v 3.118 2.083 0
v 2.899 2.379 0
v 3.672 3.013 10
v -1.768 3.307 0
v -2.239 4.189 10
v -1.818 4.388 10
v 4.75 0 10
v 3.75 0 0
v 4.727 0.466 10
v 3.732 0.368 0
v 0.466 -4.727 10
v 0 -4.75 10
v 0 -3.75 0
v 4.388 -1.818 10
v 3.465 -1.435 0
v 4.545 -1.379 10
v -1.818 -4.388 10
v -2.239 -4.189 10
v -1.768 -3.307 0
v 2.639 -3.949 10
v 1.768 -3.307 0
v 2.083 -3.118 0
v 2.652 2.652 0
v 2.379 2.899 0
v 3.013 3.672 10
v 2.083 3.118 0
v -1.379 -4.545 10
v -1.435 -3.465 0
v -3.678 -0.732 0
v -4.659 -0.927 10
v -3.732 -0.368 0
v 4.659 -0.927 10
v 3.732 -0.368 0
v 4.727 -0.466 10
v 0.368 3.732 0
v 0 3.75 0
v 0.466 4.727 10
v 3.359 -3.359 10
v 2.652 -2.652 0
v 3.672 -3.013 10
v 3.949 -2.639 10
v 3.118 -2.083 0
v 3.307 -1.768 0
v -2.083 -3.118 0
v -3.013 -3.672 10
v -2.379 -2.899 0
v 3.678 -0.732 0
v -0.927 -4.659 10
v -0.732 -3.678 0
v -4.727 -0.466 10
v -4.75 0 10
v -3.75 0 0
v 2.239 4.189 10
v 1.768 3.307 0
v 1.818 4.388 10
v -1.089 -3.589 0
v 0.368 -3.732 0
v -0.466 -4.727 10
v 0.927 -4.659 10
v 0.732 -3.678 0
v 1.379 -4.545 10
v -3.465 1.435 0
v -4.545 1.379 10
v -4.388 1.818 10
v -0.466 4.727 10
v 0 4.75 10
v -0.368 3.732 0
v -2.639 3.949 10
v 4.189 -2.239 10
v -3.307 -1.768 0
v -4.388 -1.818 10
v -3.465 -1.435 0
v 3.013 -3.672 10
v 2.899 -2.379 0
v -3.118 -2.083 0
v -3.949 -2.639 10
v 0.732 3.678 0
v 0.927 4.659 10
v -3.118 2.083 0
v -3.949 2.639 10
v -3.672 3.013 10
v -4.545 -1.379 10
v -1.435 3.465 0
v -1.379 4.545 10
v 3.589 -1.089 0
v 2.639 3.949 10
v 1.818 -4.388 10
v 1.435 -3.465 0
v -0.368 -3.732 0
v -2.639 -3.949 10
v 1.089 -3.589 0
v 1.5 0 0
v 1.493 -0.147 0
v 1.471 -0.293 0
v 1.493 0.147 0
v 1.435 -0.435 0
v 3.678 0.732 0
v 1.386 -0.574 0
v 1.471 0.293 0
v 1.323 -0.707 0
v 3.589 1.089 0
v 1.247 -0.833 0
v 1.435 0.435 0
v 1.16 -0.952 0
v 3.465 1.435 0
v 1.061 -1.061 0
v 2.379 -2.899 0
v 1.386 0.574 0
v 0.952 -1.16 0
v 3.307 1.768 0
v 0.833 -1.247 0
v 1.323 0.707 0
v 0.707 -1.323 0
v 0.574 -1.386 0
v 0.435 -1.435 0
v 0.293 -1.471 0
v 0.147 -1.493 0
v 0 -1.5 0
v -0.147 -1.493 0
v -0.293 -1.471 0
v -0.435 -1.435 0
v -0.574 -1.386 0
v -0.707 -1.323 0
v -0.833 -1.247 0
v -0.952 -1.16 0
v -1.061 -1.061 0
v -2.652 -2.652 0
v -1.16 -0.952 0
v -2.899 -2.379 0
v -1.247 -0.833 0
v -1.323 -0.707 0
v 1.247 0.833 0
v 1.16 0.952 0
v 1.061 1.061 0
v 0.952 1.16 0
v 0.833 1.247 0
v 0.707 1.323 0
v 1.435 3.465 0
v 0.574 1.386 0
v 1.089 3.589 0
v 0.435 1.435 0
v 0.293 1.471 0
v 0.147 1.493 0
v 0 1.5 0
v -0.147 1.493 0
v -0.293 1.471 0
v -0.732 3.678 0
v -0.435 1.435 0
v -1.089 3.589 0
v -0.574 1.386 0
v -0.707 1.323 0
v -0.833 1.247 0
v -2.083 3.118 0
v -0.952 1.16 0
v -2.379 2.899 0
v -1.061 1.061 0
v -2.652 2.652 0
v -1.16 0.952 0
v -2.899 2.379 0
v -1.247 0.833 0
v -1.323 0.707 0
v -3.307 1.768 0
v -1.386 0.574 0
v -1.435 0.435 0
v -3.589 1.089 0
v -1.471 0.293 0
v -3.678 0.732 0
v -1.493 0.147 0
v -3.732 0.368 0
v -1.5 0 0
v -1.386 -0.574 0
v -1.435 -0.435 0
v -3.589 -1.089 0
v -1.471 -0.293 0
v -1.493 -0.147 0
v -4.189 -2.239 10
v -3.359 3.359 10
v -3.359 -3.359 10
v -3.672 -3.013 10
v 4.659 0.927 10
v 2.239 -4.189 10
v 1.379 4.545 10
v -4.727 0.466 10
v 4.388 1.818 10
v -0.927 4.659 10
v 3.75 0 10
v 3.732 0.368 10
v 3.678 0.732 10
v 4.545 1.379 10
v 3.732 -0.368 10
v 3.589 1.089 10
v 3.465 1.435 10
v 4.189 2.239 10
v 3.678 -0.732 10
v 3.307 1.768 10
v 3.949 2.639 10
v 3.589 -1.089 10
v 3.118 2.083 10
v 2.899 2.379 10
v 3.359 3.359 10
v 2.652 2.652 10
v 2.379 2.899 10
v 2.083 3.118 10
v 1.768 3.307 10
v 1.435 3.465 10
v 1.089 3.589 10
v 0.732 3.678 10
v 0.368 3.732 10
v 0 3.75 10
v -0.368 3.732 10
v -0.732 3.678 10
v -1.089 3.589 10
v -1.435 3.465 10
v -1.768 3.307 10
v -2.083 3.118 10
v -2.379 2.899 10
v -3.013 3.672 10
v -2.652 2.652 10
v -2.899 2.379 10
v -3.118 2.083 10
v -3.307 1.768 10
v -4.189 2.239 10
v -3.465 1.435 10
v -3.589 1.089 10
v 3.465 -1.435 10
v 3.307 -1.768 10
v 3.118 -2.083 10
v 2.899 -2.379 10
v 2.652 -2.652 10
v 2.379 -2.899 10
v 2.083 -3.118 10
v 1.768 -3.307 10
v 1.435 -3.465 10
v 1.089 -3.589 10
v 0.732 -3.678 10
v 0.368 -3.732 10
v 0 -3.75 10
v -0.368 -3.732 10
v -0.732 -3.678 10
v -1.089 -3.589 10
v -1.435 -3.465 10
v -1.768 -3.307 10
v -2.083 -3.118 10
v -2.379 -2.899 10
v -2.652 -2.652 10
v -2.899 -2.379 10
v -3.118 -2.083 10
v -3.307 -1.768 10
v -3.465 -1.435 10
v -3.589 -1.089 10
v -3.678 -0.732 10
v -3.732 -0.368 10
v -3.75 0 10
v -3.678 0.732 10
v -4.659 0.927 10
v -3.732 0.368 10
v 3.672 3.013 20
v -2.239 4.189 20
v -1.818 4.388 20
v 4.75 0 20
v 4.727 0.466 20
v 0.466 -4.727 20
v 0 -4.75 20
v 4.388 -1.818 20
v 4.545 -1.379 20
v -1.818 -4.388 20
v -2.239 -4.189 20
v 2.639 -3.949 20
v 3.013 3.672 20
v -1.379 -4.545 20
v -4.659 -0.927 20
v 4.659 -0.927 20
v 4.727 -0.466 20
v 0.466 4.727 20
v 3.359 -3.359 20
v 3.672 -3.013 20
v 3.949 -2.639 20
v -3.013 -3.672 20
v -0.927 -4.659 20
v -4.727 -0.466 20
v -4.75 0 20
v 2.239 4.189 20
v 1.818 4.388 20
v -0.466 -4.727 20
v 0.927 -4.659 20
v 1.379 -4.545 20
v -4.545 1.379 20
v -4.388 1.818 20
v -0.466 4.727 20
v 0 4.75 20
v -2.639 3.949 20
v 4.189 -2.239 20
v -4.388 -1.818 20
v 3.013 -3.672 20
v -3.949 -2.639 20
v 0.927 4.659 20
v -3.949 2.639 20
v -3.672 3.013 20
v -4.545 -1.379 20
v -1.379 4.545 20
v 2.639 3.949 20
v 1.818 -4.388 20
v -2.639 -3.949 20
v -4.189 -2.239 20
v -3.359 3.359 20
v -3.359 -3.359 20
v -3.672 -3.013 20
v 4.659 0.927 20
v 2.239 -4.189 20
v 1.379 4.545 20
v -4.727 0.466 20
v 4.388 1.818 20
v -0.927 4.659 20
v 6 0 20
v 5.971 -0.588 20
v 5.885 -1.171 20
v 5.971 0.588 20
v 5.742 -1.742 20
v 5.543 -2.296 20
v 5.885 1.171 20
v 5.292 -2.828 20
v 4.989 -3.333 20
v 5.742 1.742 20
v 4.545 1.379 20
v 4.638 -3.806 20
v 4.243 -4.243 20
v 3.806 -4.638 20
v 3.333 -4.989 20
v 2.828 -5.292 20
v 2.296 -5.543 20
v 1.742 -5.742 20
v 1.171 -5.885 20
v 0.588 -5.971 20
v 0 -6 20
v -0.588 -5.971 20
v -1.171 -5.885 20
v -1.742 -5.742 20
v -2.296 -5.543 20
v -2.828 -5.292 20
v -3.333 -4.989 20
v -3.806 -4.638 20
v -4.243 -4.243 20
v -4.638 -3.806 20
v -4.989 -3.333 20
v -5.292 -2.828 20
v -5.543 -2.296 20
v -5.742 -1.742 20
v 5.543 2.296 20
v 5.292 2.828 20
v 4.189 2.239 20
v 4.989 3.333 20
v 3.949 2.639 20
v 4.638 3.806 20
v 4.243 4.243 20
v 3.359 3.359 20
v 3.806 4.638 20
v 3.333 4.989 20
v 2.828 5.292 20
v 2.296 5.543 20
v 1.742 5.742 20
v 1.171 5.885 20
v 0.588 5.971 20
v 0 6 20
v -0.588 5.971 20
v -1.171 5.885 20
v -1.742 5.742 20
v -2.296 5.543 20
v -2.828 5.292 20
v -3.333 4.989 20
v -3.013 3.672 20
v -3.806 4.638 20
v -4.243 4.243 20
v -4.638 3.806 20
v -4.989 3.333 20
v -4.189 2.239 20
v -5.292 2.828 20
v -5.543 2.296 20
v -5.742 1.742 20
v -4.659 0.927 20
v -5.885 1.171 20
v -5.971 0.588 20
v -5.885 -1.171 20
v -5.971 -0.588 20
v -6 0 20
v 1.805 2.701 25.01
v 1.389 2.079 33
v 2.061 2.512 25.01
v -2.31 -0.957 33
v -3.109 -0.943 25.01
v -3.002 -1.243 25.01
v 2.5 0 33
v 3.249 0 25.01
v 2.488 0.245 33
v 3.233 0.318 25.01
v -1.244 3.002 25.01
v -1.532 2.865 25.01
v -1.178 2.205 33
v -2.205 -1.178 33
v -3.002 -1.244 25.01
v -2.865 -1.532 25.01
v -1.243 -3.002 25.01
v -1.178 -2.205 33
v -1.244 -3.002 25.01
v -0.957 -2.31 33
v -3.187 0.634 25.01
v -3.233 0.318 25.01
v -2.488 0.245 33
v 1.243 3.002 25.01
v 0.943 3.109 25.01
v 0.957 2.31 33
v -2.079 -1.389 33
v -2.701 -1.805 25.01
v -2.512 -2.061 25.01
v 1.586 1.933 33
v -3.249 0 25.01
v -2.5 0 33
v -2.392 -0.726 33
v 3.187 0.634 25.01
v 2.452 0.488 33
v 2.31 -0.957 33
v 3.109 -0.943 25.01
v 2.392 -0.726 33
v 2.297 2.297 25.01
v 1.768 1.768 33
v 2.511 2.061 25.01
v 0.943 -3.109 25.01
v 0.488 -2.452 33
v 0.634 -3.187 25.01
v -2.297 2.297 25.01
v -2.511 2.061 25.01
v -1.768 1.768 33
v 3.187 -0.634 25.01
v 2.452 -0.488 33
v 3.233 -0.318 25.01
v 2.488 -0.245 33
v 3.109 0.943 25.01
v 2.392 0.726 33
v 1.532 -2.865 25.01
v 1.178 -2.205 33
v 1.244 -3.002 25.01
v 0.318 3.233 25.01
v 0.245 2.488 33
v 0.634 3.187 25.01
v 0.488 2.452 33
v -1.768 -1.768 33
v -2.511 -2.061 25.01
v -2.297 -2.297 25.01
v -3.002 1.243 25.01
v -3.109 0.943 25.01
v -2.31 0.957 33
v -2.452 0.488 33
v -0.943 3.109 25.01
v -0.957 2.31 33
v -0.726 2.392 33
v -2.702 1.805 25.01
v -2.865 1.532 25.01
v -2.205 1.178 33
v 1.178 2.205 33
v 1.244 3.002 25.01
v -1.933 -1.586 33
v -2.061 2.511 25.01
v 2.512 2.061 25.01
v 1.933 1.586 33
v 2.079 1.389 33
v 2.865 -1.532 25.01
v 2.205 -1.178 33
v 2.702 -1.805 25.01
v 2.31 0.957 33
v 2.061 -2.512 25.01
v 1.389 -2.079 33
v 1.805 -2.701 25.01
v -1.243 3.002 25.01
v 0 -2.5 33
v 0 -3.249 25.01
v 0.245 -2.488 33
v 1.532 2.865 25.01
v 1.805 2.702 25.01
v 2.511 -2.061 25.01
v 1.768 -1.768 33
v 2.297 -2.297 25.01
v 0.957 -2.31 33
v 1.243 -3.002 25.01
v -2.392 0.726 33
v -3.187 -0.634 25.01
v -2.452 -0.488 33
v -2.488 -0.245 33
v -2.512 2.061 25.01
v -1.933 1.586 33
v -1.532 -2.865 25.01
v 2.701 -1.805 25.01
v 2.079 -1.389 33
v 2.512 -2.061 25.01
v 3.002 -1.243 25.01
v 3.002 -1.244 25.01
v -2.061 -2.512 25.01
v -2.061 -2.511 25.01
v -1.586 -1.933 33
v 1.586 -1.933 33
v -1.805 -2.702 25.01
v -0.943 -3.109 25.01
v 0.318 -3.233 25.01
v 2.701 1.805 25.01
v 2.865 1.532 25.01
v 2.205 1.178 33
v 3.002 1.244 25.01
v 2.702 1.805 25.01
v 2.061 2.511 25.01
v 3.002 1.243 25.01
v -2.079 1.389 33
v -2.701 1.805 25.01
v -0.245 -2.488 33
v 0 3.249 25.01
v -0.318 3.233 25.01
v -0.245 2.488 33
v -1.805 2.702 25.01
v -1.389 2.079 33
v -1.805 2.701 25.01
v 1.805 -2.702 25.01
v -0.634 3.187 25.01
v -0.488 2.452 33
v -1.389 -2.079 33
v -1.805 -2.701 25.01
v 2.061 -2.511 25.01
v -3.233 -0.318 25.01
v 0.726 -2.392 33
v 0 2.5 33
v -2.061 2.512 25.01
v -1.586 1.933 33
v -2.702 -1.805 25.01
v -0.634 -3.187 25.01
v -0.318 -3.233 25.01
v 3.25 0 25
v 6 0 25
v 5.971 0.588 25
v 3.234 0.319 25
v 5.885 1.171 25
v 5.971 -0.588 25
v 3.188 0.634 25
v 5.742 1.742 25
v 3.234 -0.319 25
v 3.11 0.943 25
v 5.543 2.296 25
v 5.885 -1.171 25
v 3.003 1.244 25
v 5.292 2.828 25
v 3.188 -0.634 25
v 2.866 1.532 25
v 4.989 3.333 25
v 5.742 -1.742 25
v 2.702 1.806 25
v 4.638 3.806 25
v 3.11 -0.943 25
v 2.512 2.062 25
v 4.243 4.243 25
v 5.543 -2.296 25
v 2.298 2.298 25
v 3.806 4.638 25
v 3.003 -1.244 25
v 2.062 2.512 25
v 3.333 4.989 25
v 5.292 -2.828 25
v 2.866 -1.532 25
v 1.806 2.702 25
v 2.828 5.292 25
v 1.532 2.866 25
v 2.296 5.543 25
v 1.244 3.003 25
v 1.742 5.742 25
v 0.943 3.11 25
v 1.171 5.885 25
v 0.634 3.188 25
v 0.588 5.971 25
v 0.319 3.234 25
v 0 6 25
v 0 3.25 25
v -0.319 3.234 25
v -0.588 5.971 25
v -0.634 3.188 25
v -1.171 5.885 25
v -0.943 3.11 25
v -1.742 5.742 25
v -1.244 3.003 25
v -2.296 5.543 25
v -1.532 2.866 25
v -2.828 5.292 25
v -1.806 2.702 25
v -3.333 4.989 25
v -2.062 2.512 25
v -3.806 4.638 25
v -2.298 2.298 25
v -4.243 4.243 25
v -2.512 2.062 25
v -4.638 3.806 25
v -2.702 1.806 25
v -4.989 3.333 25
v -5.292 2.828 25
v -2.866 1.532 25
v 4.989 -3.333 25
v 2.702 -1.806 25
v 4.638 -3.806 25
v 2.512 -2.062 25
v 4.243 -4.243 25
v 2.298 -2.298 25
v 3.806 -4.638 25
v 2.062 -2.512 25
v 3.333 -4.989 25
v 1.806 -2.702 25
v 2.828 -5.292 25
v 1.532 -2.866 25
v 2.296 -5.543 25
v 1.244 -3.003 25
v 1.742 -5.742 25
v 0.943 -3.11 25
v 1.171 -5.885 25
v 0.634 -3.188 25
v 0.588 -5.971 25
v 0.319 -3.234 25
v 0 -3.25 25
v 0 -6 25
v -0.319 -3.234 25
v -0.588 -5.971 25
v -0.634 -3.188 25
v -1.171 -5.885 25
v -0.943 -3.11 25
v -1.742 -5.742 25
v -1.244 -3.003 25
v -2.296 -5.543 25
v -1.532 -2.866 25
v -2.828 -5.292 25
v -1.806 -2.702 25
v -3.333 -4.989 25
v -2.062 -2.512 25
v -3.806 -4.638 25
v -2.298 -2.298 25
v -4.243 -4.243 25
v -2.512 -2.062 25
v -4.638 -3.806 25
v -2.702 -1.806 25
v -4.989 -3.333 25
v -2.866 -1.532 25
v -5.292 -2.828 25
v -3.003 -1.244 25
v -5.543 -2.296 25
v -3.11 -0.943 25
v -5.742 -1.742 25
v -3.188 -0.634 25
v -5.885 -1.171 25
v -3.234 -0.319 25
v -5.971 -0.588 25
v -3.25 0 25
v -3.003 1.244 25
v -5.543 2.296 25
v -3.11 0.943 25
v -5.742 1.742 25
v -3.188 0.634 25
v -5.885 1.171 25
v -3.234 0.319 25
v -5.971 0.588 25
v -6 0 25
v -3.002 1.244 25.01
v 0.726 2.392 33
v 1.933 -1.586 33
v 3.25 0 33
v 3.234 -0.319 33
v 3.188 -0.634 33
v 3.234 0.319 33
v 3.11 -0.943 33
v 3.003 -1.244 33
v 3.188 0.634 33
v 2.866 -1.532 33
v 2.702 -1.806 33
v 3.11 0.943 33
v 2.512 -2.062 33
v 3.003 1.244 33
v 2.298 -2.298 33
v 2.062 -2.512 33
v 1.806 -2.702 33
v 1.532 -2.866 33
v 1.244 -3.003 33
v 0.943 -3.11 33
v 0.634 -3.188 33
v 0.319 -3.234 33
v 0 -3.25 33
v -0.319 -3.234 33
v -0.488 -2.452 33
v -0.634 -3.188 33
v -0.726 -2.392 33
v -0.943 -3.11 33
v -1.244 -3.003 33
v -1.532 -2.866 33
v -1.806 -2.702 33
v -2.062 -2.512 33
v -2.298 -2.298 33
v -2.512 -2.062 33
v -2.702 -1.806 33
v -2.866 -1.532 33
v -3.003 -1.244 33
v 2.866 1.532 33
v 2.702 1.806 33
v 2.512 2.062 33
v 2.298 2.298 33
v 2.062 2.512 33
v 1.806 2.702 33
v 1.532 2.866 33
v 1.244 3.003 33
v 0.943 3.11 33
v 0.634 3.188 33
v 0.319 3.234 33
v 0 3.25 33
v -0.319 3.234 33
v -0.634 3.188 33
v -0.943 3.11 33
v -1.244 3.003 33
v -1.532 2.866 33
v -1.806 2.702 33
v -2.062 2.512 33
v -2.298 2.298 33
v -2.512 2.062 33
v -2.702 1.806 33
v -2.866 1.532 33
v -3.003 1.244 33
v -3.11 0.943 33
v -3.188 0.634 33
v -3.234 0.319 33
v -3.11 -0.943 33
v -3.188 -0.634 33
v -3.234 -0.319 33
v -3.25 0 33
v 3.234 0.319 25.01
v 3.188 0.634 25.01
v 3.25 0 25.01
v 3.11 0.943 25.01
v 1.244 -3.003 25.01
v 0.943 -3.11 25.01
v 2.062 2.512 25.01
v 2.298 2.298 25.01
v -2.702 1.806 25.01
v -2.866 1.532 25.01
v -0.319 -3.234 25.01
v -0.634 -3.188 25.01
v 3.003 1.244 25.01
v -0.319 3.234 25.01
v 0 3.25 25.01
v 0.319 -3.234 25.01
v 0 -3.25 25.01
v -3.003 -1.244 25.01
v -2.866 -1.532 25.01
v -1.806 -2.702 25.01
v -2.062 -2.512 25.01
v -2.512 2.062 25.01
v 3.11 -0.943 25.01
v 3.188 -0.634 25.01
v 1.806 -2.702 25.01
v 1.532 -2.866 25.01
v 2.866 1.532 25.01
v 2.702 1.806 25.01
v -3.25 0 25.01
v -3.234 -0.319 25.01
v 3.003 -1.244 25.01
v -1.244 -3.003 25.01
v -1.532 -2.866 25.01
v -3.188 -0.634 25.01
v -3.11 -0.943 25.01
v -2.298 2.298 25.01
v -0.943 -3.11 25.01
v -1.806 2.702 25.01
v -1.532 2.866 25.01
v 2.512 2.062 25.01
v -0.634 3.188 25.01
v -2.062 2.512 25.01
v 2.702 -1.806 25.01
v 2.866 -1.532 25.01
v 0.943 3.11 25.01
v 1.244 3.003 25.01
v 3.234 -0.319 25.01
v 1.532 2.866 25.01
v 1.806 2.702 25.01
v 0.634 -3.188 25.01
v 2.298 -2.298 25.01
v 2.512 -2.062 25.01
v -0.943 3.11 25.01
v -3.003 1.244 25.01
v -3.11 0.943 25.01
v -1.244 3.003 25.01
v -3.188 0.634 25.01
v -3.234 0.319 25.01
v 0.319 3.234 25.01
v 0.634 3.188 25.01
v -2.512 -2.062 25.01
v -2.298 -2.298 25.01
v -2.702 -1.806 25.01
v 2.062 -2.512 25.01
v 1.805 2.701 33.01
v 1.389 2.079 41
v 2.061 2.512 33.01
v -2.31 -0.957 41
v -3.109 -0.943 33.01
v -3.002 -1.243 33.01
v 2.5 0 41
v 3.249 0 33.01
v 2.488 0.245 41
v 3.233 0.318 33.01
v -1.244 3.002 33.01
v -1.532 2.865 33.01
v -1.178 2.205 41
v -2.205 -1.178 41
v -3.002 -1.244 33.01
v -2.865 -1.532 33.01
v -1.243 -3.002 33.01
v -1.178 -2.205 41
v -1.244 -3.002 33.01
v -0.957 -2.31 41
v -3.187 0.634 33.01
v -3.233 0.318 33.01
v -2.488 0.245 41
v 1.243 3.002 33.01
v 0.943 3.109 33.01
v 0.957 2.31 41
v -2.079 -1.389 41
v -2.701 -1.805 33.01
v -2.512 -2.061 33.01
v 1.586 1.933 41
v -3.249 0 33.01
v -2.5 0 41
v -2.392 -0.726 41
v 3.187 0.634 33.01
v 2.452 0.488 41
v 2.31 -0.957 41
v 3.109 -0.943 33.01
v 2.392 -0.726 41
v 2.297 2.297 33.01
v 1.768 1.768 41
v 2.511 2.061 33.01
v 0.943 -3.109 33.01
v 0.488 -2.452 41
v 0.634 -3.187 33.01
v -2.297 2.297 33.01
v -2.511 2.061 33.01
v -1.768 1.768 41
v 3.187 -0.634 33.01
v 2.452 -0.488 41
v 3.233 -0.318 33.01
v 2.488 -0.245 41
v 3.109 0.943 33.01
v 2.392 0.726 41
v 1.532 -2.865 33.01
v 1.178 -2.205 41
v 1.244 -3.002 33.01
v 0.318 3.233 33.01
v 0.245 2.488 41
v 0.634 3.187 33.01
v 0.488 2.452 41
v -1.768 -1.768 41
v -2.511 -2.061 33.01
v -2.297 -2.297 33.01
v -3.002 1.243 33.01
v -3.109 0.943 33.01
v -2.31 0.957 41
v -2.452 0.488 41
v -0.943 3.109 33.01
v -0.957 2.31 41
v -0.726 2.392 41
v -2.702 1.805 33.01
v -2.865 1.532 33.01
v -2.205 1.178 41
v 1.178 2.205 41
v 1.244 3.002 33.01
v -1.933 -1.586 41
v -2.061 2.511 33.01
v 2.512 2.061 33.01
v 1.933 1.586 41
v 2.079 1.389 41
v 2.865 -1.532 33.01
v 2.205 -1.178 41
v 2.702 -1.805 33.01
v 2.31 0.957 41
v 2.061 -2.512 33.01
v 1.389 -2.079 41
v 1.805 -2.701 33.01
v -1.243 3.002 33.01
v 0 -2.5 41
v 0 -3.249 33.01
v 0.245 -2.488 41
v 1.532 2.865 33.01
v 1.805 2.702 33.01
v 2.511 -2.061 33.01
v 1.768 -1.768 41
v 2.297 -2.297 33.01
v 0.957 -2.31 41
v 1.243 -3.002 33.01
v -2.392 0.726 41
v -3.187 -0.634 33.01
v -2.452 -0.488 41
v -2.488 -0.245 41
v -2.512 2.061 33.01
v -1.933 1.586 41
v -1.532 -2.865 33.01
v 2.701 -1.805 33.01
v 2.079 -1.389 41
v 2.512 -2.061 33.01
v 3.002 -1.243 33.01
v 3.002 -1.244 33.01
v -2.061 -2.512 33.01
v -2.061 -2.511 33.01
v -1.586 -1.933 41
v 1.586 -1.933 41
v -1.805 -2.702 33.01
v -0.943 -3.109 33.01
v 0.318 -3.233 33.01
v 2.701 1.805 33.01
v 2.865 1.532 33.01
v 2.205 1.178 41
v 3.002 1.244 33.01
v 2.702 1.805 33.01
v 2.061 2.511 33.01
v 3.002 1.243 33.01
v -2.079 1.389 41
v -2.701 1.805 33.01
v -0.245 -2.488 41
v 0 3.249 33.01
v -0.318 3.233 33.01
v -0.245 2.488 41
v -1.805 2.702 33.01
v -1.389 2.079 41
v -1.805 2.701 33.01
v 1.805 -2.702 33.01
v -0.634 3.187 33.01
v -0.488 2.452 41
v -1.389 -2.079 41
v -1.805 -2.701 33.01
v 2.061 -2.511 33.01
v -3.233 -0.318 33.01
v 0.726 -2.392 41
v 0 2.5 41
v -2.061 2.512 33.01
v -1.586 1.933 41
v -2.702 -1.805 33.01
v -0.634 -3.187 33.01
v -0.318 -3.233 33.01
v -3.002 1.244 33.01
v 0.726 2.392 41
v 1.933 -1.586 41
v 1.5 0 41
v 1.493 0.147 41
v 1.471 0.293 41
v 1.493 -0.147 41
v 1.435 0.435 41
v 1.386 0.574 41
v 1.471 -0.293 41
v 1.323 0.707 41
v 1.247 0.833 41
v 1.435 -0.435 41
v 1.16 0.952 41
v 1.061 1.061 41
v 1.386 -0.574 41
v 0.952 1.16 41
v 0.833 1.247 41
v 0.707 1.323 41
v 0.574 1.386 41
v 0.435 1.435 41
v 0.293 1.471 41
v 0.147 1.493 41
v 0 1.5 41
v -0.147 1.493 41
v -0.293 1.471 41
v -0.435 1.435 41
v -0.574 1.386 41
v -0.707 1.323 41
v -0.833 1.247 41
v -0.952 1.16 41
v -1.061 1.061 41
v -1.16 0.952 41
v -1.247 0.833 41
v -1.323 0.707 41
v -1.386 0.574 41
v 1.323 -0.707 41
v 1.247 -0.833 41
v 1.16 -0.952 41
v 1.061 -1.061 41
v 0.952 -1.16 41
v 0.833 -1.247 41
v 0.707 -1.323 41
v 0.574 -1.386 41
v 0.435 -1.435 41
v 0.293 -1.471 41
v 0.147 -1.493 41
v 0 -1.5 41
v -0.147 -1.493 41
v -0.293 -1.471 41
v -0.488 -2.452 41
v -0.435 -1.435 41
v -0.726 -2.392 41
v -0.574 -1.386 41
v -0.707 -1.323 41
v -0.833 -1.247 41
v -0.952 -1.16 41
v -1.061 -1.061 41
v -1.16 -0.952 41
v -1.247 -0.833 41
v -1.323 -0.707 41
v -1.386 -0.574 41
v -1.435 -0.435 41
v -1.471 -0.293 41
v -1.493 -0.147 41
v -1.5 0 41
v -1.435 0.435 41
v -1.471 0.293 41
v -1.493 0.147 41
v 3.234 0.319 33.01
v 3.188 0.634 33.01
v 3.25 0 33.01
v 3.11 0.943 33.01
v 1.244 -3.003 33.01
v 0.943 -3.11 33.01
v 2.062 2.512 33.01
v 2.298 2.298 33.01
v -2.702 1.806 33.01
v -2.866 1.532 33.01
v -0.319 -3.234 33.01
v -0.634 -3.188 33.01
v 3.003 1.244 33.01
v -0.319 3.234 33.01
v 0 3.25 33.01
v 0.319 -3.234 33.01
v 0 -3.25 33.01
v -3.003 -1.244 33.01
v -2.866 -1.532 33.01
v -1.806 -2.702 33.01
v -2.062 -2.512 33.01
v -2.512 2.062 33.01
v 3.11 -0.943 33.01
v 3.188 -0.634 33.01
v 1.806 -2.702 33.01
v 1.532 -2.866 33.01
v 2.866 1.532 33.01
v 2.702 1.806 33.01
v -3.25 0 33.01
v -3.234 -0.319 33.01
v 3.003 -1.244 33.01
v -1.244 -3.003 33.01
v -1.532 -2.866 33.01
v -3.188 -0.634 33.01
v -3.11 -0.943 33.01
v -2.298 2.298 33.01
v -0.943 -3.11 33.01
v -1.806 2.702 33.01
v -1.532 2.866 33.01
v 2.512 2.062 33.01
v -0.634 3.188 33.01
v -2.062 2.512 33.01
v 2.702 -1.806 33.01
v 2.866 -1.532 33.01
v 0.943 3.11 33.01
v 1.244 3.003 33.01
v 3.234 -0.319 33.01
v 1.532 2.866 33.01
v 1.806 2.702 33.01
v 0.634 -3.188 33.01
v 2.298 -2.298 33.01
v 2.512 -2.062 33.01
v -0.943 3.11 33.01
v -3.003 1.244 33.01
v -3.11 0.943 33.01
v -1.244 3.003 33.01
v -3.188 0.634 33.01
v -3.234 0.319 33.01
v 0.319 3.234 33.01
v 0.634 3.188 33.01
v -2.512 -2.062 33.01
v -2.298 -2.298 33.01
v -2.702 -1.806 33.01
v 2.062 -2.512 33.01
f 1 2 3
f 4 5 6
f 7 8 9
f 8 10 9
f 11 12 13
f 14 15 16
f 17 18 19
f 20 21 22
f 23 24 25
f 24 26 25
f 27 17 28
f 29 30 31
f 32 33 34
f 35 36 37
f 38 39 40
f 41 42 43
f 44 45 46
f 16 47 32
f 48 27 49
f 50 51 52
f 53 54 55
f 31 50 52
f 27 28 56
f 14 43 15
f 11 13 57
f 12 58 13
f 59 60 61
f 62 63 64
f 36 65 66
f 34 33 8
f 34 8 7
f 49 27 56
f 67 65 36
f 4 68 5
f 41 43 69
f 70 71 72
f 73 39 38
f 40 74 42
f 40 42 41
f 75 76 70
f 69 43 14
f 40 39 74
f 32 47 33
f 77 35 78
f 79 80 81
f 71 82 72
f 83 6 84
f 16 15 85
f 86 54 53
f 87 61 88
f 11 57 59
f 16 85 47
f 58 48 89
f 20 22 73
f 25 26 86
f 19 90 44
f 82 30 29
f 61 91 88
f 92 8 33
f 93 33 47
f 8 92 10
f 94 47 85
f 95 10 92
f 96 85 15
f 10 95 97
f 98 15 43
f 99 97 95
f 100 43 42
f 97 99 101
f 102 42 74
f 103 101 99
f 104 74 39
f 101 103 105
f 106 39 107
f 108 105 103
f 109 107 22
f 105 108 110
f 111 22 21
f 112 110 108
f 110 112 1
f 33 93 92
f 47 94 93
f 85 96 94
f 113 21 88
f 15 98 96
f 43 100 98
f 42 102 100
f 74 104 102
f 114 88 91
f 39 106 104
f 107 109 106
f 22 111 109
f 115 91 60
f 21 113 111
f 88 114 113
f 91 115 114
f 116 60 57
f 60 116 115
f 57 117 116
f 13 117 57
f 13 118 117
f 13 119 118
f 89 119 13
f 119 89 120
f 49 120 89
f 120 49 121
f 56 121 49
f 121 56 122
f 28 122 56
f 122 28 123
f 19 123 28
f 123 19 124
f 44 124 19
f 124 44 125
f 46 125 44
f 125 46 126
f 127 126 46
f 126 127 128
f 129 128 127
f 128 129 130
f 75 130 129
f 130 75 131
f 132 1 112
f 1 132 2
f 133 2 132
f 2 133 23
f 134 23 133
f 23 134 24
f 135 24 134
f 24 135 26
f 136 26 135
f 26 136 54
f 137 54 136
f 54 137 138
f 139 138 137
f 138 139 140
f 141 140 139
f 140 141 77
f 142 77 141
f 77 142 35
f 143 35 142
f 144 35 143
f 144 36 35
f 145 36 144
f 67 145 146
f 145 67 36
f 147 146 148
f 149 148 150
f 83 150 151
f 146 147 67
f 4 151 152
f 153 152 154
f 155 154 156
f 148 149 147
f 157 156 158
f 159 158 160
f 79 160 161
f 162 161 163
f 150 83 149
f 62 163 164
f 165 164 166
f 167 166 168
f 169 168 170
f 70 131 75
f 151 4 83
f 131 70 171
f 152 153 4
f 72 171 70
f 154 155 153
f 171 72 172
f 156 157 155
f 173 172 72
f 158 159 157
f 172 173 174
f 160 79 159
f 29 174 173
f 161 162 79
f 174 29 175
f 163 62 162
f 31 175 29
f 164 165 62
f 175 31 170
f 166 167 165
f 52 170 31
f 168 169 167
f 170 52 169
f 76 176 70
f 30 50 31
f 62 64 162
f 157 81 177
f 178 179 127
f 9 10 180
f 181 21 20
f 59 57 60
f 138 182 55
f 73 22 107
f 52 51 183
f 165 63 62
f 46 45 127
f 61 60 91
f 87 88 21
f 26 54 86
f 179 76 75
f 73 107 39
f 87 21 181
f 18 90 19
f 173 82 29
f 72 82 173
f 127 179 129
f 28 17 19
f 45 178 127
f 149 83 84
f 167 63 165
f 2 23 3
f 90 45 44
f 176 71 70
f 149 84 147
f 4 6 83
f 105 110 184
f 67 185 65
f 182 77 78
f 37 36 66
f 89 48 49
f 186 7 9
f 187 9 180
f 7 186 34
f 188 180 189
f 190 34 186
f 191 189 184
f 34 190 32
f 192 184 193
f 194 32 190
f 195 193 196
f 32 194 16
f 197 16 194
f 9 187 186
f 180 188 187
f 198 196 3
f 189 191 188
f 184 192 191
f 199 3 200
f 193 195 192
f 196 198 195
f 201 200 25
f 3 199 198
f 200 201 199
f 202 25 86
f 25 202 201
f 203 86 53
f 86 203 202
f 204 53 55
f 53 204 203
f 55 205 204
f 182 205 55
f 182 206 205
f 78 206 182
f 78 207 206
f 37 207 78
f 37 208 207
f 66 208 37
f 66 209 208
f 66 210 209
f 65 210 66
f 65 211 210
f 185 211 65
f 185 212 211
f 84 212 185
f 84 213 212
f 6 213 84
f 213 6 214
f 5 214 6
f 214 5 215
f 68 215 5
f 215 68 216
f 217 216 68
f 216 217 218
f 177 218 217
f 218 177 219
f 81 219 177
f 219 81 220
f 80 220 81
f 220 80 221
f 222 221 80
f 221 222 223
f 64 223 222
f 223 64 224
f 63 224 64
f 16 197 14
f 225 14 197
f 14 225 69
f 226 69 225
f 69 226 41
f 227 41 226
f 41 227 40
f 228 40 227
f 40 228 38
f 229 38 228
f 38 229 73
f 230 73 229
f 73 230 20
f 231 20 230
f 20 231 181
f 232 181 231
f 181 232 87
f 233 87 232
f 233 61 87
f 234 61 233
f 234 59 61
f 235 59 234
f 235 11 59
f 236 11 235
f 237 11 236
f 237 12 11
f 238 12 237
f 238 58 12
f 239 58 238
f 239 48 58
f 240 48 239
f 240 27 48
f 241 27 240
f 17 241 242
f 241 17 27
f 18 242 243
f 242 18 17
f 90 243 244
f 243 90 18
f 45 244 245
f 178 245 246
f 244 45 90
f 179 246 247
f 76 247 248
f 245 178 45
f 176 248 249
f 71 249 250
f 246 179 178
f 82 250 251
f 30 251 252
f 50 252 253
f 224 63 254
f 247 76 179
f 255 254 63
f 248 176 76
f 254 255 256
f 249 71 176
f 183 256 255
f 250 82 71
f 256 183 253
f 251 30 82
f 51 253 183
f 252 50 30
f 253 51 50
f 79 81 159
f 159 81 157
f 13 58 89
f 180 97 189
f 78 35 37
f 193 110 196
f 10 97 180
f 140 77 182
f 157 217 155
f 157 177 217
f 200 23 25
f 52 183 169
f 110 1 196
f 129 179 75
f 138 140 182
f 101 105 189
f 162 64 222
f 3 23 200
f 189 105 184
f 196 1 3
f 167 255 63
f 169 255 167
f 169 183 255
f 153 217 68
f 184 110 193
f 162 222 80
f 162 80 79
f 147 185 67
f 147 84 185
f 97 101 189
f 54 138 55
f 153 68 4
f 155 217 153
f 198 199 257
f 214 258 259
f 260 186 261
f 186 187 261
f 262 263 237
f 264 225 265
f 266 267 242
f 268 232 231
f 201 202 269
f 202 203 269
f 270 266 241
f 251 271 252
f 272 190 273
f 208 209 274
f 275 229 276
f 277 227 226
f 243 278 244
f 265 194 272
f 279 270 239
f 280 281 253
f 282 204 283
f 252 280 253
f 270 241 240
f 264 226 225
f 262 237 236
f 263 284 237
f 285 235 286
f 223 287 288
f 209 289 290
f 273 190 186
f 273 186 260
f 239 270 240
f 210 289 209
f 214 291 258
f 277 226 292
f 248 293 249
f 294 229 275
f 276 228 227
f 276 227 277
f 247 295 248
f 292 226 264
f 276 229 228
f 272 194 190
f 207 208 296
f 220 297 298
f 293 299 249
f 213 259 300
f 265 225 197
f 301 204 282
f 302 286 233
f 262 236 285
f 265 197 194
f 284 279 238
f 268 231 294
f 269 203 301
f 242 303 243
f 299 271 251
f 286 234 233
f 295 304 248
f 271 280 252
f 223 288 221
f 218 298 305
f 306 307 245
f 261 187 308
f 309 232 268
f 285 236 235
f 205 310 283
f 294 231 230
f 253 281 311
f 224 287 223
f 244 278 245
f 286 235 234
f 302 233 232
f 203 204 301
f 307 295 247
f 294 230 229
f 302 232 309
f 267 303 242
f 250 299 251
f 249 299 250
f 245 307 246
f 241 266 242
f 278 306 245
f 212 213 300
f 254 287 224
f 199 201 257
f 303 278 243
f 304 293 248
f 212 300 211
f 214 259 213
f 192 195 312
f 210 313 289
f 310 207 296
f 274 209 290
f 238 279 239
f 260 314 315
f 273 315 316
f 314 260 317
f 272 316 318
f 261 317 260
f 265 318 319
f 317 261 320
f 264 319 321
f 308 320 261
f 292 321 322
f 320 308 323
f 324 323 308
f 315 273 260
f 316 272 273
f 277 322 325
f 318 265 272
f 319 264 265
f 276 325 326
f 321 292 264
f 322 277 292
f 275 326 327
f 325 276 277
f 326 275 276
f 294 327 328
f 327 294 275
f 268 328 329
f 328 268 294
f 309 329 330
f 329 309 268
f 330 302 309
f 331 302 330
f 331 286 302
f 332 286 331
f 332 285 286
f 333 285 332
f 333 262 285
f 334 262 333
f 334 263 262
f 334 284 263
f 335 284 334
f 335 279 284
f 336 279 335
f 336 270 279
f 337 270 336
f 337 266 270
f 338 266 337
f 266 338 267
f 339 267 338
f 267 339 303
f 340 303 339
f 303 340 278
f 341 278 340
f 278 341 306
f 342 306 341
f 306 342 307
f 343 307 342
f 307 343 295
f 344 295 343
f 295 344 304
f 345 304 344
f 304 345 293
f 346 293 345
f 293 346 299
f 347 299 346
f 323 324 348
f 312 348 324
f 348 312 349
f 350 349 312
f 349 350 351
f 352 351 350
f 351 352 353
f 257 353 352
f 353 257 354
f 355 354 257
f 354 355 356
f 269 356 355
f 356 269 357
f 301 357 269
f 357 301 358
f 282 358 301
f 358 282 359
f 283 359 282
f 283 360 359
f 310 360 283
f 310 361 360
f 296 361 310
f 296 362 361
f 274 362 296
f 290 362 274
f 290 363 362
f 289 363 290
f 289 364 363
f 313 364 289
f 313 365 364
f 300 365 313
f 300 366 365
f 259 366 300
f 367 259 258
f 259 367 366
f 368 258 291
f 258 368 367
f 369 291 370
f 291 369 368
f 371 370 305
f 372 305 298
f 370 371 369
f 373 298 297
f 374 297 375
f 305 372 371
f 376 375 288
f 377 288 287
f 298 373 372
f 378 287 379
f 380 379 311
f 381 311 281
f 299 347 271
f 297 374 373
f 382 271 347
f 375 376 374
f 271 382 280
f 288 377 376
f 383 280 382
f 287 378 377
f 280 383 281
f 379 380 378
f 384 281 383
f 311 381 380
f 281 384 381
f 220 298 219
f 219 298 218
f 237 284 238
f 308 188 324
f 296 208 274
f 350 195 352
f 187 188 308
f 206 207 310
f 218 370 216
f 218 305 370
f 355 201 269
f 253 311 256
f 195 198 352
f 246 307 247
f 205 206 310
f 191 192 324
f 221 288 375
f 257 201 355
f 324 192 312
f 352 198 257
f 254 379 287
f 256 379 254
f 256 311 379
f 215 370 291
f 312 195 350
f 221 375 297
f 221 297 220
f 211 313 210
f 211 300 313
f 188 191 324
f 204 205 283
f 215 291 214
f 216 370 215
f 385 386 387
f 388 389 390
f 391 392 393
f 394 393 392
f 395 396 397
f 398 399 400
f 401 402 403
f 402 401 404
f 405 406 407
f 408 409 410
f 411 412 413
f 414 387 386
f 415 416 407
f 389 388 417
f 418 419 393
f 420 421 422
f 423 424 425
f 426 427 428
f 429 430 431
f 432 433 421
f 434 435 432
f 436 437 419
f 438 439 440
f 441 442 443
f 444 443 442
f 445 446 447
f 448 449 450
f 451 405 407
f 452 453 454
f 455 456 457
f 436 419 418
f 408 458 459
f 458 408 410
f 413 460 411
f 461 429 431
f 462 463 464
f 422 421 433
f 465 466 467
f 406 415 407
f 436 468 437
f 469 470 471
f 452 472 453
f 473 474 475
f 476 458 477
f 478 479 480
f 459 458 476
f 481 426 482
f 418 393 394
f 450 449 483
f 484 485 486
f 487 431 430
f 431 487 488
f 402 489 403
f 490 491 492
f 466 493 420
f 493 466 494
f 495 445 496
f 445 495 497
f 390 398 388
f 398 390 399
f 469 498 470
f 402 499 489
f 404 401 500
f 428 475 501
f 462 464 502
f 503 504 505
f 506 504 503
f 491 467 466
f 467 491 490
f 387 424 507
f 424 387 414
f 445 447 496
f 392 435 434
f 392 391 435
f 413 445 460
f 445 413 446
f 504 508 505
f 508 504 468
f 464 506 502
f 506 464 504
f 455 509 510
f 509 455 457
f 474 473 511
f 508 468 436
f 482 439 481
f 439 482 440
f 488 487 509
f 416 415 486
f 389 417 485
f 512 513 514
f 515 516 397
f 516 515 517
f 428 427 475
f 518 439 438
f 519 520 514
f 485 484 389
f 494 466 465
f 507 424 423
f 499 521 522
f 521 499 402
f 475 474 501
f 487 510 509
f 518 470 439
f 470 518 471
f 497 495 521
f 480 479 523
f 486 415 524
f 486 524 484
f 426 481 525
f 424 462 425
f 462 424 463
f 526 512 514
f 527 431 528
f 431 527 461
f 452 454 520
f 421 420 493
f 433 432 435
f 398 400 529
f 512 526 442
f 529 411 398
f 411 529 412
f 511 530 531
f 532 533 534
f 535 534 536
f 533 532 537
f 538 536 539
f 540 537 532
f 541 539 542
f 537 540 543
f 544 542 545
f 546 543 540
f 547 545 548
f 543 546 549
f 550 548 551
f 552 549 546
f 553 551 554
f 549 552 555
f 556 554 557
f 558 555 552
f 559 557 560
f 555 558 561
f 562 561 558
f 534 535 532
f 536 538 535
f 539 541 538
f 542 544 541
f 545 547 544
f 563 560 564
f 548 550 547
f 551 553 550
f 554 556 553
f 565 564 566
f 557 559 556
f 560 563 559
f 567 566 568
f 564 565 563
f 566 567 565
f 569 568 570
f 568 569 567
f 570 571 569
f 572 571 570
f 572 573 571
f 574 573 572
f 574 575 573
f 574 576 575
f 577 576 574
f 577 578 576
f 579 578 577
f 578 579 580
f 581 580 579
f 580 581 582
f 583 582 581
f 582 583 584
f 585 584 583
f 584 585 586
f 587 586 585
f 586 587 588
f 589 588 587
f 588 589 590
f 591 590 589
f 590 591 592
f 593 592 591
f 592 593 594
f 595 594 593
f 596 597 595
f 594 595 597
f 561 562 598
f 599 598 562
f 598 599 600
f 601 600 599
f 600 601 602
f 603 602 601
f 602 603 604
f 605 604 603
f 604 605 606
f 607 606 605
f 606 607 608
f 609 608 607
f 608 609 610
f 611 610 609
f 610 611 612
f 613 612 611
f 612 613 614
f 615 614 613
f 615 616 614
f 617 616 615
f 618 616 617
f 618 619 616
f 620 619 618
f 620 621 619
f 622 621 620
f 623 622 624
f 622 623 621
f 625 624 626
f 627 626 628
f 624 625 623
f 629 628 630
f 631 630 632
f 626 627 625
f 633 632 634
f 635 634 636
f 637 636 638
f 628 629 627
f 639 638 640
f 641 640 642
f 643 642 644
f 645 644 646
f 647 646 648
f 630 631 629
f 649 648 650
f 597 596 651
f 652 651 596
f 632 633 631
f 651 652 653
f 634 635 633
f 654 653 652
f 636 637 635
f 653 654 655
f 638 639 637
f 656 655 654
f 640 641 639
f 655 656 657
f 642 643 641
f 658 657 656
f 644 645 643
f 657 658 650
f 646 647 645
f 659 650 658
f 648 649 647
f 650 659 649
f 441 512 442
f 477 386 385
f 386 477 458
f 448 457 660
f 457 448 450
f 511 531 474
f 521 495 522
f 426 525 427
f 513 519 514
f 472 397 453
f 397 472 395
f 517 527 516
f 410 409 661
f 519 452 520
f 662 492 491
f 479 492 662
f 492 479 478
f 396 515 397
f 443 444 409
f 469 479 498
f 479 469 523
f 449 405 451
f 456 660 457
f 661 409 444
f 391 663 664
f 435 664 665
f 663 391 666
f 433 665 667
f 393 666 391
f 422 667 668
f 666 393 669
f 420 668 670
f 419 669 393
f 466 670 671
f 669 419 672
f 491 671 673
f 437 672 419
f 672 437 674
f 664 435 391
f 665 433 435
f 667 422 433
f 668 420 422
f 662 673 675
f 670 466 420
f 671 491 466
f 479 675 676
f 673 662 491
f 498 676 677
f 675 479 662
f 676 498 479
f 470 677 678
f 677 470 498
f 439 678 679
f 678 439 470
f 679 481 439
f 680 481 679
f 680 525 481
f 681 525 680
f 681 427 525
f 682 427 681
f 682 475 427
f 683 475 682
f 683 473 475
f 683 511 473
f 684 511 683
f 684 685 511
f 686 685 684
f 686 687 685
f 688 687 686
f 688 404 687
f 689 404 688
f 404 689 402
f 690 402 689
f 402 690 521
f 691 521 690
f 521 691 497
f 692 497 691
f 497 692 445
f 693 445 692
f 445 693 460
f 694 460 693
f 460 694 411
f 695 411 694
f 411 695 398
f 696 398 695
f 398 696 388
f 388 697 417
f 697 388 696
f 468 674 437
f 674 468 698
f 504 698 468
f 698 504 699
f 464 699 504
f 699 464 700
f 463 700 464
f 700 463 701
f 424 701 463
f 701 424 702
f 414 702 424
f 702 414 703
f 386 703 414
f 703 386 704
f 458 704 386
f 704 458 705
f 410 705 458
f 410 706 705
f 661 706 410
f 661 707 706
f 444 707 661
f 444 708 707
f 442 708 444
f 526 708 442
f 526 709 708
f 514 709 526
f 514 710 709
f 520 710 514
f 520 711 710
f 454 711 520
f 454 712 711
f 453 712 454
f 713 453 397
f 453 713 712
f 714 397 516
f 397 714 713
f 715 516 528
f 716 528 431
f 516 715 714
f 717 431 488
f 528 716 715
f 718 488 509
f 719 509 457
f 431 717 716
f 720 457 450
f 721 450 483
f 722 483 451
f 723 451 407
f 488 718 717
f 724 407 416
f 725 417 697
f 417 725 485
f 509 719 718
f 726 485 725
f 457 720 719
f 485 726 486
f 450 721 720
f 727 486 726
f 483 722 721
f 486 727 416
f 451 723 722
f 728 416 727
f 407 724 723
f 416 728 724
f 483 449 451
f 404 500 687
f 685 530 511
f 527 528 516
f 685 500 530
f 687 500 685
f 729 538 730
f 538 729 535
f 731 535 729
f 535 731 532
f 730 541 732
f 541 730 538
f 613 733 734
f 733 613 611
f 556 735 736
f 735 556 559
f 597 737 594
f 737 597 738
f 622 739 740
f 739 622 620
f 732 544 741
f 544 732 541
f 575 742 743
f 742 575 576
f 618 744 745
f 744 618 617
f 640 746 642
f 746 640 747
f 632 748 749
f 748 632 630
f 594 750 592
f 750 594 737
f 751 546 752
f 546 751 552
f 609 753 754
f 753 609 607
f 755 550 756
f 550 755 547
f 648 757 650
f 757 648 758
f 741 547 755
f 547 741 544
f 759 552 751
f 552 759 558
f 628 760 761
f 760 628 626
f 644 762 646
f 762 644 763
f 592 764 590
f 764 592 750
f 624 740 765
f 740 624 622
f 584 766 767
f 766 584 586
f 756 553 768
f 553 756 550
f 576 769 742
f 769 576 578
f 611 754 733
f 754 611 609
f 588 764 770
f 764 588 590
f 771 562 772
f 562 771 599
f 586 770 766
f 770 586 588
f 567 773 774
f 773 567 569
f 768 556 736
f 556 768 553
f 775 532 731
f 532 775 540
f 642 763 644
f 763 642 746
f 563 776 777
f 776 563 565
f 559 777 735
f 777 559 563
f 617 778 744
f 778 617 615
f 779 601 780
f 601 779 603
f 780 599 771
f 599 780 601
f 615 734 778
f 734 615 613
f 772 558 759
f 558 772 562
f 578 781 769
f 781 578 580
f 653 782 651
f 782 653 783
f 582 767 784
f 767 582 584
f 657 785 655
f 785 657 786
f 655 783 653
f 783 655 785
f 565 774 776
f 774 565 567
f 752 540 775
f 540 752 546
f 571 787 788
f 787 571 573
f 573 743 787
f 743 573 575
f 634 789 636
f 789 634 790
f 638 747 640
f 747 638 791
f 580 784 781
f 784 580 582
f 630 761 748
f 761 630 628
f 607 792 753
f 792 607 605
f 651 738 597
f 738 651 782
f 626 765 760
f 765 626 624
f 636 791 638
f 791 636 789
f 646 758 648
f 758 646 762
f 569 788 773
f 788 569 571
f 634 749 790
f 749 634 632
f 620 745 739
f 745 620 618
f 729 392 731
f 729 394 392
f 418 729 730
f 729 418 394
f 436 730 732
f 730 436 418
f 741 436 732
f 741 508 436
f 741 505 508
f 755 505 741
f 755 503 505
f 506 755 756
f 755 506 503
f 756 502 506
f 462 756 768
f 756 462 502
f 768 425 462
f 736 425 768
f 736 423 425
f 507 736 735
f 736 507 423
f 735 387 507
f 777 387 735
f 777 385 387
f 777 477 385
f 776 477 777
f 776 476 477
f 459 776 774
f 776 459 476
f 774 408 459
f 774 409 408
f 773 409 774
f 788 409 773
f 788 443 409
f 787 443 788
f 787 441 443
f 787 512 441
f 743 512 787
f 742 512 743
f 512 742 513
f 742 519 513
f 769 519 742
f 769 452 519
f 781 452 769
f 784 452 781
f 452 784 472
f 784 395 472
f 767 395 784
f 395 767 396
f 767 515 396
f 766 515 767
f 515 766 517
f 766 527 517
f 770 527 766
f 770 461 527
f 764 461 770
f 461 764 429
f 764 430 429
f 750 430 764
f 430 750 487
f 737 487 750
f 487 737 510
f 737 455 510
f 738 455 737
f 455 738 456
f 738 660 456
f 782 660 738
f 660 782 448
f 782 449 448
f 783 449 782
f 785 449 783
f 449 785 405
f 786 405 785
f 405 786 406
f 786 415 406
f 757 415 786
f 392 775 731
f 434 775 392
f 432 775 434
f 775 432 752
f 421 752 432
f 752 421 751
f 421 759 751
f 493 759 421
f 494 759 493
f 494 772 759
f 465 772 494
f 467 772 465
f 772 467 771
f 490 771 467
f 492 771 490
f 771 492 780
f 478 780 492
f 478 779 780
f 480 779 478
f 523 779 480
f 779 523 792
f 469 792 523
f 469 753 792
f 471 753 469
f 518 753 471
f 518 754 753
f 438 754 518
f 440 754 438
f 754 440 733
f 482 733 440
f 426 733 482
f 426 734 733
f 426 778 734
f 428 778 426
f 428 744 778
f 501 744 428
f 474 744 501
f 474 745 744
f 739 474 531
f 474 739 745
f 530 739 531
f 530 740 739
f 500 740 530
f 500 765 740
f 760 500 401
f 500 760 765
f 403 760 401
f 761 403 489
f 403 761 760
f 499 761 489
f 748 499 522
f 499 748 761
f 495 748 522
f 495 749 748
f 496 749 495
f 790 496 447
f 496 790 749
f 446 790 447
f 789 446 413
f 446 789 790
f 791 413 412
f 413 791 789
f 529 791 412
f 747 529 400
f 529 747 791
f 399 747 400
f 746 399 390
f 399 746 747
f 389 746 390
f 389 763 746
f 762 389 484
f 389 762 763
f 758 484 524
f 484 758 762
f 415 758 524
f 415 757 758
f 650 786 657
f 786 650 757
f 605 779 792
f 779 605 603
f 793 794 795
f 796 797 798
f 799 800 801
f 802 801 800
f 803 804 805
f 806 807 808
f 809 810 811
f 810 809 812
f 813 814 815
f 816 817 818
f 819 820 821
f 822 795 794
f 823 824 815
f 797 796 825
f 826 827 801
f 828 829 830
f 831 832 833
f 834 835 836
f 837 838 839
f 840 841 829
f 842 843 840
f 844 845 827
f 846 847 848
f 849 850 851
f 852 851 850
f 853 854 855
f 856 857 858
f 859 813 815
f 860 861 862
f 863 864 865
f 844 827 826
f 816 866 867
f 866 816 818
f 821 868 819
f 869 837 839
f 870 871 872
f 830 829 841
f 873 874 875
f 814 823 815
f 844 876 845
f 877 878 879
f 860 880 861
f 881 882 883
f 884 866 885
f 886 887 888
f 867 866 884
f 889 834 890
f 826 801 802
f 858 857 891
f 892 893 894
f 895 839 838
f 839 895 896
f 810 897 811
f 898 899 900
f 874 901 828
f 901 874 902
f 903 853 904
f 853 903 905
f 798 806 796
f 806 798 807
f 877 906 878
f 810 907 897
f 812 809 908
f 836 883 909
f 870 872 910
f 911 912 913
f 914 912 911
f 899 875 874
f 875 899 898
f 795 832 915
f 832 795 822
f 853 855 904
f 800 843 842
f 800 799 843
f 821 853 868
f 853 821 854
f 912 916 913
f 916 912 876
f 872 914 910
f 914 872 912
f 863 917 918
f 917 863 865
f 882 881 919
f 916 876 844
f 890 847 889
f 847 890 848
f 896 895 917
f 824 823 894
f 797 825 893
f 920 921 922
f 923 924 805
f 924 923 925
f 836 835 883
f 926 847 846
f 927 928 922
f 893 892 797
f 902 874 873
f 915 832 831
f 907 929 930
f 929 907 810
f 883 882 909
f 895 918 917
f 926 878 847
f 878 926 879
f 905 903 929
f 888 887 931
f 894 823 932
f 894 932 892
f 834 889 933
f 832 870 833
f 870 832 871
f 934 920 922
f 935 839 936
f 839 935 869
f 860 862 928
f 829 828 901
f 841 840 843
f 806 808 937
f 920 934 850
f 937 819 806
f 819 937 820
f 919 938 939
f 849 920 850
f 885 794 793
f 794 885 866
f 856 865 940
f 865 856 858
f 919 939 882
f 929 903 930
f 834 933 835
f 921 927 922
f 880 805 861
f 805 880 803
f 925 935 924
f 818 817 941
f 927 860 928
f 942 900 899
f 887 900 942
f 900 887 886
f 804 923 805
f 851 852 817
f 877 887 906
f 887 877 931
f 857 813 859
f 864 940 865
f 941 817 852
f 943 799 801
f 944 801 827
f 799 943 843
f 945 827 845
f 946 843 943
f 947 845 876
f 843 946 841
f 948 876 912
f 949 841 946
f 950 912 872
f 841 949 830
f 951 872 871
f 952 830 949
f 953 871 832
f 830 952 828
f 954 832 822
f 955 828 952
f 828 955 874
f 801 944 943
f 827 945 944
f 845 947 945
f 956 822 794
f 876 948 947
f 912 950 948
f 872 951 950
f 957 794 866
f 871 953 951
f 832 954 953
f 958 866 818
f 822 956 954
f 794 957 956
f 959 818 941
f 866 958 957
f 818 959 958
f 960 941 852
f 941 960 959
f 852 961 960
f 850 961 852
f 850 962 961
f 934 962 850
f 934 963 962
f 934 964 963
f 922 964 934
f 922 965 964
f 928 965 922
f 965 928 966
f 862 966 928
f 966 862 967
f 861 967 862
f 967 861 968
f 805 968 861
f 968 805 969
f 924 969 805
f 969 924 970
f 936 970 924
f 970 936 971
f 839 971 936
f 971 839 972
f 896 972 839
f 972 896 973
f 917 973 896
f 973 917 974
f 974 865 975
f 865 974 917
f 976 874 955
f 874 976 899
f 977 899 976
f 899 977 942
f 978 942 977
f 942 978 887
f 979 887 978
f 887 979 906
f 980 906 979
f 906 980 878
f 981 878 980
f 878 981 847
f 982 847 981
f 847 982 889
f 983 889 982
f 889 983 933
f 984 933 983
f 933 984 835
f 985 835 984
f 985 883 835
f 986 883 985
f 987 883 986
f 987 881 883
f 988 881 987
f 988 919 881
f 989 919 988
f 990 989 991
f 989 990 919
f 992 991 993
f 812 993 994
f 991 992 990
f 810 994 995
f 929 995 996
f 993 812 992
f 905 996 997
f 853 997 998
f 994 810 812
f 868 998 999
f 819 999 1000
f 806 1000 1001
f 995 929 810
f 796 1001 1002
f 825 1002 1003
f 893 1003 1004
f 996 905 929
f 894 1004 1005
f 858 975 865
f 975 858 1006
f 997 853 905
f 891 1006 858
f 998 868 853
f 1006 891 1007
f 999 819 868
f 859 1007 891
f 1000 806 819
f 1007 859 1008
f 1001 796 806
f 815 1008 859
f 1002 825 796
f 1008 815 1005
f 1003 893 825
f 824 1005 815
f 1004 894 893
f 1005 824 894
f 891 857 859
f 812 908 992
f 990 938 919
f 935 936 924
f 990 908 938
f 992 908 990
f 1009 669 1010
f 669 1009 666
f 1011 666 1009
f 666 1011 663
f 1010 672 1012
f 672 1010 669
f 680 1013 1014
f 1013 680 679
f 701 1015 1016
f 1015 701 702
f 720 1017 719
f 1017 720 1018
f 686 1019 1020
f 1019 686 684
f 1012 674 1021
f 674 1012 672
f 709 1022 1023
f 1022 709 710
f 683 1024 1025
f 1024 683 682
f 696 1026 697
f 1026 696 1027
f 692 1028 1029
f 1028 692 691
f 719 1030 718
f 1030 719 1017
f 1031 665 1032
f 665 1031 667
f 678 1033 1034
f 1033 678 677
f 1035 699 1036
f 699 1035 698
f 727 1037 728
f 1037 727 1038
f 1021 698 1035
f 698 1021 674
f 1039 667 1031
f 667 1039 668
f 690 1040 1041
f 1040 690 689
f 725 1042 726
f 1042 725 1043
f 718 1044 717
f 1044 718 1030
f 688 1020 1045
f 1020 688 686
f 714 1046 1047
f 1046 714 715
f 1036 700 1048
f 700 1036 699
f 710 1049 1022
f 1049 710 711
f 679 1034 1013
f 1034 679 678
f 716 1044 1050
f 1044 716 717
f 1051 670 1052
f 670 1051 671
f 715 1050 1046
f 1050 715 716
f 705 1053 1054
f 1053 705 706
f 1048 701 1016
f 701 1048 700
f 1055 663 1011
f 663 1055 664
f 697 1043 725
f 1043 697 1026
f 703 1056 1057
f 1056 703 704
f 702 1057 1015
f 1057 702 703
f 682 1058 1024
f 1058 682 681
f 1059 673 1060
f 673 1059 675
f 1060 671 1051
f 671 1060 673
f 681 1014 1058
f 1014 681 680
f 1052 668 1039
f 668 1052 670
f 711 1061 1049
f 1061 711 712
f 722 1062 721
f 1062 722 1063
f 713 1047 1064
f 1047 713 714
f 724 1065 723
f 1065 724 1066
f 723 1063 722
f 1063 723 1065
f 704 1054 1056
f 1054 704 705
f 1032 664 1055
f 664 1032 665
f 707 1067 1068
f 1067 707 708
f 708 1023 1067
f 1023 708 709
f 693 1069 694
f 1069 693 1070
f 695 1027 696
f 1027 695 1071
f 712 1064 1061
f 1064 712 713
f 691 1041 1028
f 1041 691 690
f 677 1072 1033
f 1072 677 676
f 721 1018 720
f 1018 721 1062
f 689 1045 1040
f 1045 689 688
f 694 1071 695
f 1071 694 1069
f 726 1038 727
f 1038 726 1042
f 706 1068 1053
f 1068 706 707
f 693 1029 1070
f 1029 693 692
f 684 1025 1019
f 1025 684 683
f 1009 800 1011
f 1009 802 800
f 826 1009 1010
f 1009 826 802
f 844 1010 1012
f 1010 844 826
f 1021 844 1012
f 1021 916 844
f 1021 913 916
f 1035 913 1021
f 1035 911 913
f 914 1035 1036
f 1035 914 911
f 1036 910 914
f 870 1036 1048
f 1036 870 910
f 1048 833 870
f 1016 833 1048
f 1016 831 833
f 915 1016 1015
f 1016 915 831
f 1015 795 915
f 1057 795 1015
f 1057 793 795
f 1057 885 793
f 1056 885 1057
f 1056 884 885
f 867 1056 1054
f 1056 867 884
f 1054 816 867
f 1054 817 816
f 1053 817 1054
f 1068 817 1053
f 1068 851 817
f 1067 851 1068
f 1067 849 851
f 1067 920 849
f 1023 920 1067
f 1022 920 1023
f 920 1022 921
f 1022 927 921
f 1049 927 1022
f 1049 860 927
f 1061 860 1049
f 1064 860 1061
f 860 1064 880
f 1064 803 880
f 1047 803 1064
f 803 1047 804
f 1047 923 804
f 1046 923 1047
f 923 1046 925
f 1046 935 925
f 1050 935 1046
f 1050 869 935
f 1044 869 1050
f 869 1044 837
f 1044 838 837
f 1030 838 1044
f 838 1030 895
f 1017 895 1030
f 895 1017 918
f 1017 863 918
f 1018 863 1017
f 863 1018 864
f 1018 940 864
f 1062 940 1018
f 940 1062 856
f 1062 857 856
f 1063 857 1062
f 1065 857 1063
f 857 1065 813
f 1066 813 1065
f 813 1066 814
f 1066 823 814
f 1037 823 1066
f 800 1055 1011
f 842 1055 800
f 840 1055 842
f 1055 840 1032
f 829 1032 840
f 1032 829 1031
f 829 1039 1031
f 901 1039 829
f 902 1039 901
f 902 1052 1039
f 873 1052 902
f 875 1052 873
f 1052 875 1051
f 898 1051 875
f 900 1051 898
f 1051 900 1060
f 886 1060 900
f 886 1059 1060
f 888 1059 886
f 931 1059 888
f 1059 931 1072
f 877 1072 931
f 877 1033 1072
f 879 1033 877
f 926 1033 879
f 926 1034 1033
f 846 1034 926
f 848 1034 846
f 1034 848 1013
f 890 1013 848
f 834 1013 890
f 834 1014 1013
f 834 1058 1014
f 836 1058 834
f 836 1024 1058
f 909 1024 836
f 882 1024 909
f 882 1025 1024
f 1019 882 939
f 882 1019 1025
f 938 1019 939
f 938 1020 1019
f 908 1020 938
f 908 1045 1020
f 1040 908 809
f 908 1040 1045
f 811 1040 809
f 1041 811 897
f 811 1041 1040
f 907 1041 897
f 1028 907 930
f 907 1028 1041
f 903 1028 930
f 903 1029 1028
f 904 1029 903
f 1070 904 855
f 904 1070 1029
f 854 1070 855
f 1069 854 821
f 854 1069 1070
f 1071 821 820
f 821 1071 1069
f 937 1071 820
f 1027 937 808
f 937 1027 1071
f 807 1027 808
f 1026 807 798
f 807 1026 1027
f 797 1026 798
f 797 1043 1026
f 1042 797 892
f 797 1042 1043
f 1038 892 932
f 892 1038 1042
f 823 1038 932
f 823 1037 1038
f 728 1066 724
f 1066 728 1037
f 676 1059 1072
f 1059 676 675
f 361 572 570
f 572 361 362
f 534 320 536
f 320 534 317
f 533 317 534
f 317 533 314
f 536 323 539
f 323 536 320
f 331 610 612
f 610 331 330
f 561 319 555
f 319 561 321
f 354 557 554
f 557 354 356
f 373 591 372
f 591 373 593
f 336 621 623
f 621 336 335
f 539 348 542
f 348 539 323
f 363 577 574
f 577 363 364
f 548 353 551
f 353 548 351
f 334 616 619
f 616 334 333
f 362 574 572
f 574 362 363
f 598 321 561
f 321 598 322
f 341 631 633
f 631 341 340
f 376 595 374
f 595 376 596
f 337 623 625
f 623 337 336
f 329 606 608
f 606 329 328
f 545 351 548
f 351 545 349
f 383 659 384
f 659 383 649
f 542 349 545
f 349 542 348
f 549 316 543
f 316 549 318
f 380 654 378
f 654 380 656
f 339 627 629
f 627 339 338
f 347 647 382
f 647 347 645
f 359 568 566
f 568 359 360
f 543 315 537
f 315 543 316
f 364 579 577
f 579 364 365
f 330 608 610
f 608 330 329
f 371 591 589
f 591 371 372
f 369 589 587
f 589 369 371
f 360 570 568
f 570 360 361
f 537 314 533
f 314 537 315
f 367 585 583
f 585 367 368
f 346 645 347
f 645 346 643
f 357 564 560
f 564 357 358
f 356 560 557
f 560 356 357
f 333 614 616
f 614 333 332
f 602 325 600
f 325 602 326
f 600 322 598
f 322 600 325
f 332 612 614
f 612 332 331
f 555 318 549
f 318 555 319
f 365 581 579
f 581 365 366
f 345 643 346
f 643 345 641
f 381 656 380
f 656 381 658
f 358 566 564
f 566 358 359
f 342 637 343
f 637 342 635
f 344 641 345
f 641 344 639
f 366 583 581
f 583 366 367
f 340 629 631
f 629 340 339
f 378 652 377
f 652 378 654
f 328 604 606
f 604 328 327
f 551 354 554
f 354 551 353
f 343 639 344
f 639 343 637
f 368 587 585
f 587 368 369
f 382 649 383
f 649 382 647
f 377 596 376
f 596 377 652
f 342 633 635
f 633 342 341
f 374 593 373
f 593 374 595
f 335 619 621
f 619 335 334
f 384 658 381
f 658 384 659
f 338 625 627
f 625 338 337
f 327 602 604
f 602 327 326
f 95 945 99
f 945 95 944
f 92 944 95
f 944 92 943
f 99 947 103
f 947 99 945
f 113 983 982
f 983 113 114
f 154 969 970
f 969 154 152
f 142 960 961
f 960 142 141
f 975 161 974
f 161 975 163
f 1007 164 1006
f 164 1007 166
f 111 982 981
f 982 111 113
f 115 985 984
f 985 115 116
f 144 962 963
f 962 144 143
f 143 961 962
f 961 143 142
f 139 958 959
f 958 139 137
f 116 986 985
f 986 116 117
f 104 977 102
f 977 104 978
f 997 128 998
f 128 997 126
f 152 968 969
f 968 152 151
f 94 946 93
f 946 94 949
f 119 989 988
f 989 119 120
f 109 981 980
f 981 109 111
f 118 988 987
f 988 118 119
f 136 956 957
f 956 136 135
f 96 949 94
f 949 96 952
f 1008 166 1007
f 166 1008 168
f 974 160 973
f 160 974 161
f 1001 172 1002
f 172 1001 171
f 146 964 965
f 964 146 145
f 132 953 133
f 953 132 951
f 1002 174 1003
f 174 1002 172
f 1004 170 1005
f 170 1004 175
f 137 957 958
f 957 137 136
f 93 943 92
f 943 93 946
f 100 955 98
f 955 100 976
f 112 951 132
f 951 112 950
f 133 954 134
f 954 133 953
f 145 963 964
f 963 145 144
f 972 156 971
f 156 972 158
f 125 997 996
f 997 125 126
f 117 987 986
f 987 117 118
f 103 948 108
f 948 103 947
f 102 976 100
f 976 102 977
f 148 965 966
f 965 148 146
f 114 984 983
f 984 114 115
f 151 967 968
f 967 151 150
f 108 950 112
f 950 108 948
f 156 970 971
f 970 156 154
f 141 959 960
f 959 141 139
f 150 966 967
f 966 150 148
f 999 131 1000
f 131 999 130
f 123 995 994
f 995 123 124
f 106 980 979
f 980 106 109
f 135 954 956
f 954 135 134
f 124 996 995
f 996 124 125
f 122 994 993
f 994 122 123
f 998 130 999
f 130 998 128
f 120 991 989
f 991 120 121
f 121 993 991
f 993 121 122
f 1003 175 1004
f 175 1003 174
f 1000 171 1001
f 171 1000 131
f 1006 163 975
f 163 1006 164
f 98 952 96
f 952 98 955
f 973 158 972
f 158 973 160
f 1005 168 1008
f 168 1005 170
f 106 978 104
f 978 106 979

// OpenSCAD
// Hose-barb reducer: 8mm ID to 5mm ID silicone tubing
// Print orientation: upright along Z, resting on XY plane at z=0

// --- Dimensions (mm) ---
BORE_DIA = 3.0;          // Through-bore diameter
COLLAR_DIA = 12.0;        // Collar outer diameter
COLLAR_HEIGHT = 5.0;    // Collar height (z=20 to z=25)

// 8mm tubing section (z=0 to z=20)
BARB1_HEIGHT = 10.0;      // Height of each 8mm barb
BARB1_BOTTOM_DIA = 7.5;   // Smaller diameter at bottom of 8mm barb
BARB1_TOP_DIA = 9.5;      // Larger diameter at top of 8mm barb

// 5mm tubing section (z=25 to z=41)
BARB2_HEIGHT = 8.0;      // Height of each 5mm barb
BARB2_BOTTOM_DIA = 6.5;   // Smaller diameter at bottom of 5mm barb
BARB2_TOP_DIA = 5.0;      // Larger diameter at top of 5mm barb

// --- Helper: single sawtooth barb (diameter grows linearly, then steps back) ---
// A barb has two parts: a conical frustum (linear taper) and a flat step-back
module sawtooth_barb(height, bottom_dia, top_dia, bore_dia) {
    // Conical frustum (linear taper from bottom to top)
    cylinder(h = height, d1 = bottom_dia, d2 = top_dia, center = false, $fn = 64);
    // Flat step-back: extends slightly past bottom to ensure clean cut
    cylinder(h = 0.01, d = bottom_dia, center = false, $fn = 64);
}

// --- Build the part ---
difference() {
    union() {
        // 8mm tubing barbs (z=0 to z=20): two stacked barbs
        // First barb: z=0 to z=10
        translate([0, 0, 0])
            sawtooth_barb(BARB1_HEIGHT, BARB1_BOTTOM_DIA, BARB1_TOP_DIA, BORE_DIA);
        // Second barb: z=10 to z=20
        translate([0, 0, BARB1_HEIGHT])
            sawtooth_barb(BARB1_HEIGHT, BARB1_BOTTOM_DIA, BARB1_TOP_DIA, BORE_DIA);
        
        // Collar (z=20 to z=25)
        translate([0, 0, 20])
            cylinder(h = COLLAR_HEIGHT, d = COLLAR_DIA, center = false, $fn = 64);
        
        // 5mm tubing barbs (z=25 to z=41): two stacked barbs
        // First barb: z=25 to z=33
        translate([0, 0, 25])
            sawtooth_barb(BARB2_HEIGHT, BARB2_BOTTOM_DIA, BARB2_TOP_DIA, BORE_DIA);
        // Second barb: z=33 to z=41
        translate([0, 0, 25 + BARB2_HEIGHT])
            sawtooth_barb(BARB2_HEIGHT, BARB2_BOTTOM_DIA, BARB2_TOP_DIA, BORE_DIA);
    }
    
    // Through-bore: extend slightly past both ends for clean cutting
    cylinder(h = 41 + 0.01, d = BORE_DIA, center = false, $fn = 64);
}
